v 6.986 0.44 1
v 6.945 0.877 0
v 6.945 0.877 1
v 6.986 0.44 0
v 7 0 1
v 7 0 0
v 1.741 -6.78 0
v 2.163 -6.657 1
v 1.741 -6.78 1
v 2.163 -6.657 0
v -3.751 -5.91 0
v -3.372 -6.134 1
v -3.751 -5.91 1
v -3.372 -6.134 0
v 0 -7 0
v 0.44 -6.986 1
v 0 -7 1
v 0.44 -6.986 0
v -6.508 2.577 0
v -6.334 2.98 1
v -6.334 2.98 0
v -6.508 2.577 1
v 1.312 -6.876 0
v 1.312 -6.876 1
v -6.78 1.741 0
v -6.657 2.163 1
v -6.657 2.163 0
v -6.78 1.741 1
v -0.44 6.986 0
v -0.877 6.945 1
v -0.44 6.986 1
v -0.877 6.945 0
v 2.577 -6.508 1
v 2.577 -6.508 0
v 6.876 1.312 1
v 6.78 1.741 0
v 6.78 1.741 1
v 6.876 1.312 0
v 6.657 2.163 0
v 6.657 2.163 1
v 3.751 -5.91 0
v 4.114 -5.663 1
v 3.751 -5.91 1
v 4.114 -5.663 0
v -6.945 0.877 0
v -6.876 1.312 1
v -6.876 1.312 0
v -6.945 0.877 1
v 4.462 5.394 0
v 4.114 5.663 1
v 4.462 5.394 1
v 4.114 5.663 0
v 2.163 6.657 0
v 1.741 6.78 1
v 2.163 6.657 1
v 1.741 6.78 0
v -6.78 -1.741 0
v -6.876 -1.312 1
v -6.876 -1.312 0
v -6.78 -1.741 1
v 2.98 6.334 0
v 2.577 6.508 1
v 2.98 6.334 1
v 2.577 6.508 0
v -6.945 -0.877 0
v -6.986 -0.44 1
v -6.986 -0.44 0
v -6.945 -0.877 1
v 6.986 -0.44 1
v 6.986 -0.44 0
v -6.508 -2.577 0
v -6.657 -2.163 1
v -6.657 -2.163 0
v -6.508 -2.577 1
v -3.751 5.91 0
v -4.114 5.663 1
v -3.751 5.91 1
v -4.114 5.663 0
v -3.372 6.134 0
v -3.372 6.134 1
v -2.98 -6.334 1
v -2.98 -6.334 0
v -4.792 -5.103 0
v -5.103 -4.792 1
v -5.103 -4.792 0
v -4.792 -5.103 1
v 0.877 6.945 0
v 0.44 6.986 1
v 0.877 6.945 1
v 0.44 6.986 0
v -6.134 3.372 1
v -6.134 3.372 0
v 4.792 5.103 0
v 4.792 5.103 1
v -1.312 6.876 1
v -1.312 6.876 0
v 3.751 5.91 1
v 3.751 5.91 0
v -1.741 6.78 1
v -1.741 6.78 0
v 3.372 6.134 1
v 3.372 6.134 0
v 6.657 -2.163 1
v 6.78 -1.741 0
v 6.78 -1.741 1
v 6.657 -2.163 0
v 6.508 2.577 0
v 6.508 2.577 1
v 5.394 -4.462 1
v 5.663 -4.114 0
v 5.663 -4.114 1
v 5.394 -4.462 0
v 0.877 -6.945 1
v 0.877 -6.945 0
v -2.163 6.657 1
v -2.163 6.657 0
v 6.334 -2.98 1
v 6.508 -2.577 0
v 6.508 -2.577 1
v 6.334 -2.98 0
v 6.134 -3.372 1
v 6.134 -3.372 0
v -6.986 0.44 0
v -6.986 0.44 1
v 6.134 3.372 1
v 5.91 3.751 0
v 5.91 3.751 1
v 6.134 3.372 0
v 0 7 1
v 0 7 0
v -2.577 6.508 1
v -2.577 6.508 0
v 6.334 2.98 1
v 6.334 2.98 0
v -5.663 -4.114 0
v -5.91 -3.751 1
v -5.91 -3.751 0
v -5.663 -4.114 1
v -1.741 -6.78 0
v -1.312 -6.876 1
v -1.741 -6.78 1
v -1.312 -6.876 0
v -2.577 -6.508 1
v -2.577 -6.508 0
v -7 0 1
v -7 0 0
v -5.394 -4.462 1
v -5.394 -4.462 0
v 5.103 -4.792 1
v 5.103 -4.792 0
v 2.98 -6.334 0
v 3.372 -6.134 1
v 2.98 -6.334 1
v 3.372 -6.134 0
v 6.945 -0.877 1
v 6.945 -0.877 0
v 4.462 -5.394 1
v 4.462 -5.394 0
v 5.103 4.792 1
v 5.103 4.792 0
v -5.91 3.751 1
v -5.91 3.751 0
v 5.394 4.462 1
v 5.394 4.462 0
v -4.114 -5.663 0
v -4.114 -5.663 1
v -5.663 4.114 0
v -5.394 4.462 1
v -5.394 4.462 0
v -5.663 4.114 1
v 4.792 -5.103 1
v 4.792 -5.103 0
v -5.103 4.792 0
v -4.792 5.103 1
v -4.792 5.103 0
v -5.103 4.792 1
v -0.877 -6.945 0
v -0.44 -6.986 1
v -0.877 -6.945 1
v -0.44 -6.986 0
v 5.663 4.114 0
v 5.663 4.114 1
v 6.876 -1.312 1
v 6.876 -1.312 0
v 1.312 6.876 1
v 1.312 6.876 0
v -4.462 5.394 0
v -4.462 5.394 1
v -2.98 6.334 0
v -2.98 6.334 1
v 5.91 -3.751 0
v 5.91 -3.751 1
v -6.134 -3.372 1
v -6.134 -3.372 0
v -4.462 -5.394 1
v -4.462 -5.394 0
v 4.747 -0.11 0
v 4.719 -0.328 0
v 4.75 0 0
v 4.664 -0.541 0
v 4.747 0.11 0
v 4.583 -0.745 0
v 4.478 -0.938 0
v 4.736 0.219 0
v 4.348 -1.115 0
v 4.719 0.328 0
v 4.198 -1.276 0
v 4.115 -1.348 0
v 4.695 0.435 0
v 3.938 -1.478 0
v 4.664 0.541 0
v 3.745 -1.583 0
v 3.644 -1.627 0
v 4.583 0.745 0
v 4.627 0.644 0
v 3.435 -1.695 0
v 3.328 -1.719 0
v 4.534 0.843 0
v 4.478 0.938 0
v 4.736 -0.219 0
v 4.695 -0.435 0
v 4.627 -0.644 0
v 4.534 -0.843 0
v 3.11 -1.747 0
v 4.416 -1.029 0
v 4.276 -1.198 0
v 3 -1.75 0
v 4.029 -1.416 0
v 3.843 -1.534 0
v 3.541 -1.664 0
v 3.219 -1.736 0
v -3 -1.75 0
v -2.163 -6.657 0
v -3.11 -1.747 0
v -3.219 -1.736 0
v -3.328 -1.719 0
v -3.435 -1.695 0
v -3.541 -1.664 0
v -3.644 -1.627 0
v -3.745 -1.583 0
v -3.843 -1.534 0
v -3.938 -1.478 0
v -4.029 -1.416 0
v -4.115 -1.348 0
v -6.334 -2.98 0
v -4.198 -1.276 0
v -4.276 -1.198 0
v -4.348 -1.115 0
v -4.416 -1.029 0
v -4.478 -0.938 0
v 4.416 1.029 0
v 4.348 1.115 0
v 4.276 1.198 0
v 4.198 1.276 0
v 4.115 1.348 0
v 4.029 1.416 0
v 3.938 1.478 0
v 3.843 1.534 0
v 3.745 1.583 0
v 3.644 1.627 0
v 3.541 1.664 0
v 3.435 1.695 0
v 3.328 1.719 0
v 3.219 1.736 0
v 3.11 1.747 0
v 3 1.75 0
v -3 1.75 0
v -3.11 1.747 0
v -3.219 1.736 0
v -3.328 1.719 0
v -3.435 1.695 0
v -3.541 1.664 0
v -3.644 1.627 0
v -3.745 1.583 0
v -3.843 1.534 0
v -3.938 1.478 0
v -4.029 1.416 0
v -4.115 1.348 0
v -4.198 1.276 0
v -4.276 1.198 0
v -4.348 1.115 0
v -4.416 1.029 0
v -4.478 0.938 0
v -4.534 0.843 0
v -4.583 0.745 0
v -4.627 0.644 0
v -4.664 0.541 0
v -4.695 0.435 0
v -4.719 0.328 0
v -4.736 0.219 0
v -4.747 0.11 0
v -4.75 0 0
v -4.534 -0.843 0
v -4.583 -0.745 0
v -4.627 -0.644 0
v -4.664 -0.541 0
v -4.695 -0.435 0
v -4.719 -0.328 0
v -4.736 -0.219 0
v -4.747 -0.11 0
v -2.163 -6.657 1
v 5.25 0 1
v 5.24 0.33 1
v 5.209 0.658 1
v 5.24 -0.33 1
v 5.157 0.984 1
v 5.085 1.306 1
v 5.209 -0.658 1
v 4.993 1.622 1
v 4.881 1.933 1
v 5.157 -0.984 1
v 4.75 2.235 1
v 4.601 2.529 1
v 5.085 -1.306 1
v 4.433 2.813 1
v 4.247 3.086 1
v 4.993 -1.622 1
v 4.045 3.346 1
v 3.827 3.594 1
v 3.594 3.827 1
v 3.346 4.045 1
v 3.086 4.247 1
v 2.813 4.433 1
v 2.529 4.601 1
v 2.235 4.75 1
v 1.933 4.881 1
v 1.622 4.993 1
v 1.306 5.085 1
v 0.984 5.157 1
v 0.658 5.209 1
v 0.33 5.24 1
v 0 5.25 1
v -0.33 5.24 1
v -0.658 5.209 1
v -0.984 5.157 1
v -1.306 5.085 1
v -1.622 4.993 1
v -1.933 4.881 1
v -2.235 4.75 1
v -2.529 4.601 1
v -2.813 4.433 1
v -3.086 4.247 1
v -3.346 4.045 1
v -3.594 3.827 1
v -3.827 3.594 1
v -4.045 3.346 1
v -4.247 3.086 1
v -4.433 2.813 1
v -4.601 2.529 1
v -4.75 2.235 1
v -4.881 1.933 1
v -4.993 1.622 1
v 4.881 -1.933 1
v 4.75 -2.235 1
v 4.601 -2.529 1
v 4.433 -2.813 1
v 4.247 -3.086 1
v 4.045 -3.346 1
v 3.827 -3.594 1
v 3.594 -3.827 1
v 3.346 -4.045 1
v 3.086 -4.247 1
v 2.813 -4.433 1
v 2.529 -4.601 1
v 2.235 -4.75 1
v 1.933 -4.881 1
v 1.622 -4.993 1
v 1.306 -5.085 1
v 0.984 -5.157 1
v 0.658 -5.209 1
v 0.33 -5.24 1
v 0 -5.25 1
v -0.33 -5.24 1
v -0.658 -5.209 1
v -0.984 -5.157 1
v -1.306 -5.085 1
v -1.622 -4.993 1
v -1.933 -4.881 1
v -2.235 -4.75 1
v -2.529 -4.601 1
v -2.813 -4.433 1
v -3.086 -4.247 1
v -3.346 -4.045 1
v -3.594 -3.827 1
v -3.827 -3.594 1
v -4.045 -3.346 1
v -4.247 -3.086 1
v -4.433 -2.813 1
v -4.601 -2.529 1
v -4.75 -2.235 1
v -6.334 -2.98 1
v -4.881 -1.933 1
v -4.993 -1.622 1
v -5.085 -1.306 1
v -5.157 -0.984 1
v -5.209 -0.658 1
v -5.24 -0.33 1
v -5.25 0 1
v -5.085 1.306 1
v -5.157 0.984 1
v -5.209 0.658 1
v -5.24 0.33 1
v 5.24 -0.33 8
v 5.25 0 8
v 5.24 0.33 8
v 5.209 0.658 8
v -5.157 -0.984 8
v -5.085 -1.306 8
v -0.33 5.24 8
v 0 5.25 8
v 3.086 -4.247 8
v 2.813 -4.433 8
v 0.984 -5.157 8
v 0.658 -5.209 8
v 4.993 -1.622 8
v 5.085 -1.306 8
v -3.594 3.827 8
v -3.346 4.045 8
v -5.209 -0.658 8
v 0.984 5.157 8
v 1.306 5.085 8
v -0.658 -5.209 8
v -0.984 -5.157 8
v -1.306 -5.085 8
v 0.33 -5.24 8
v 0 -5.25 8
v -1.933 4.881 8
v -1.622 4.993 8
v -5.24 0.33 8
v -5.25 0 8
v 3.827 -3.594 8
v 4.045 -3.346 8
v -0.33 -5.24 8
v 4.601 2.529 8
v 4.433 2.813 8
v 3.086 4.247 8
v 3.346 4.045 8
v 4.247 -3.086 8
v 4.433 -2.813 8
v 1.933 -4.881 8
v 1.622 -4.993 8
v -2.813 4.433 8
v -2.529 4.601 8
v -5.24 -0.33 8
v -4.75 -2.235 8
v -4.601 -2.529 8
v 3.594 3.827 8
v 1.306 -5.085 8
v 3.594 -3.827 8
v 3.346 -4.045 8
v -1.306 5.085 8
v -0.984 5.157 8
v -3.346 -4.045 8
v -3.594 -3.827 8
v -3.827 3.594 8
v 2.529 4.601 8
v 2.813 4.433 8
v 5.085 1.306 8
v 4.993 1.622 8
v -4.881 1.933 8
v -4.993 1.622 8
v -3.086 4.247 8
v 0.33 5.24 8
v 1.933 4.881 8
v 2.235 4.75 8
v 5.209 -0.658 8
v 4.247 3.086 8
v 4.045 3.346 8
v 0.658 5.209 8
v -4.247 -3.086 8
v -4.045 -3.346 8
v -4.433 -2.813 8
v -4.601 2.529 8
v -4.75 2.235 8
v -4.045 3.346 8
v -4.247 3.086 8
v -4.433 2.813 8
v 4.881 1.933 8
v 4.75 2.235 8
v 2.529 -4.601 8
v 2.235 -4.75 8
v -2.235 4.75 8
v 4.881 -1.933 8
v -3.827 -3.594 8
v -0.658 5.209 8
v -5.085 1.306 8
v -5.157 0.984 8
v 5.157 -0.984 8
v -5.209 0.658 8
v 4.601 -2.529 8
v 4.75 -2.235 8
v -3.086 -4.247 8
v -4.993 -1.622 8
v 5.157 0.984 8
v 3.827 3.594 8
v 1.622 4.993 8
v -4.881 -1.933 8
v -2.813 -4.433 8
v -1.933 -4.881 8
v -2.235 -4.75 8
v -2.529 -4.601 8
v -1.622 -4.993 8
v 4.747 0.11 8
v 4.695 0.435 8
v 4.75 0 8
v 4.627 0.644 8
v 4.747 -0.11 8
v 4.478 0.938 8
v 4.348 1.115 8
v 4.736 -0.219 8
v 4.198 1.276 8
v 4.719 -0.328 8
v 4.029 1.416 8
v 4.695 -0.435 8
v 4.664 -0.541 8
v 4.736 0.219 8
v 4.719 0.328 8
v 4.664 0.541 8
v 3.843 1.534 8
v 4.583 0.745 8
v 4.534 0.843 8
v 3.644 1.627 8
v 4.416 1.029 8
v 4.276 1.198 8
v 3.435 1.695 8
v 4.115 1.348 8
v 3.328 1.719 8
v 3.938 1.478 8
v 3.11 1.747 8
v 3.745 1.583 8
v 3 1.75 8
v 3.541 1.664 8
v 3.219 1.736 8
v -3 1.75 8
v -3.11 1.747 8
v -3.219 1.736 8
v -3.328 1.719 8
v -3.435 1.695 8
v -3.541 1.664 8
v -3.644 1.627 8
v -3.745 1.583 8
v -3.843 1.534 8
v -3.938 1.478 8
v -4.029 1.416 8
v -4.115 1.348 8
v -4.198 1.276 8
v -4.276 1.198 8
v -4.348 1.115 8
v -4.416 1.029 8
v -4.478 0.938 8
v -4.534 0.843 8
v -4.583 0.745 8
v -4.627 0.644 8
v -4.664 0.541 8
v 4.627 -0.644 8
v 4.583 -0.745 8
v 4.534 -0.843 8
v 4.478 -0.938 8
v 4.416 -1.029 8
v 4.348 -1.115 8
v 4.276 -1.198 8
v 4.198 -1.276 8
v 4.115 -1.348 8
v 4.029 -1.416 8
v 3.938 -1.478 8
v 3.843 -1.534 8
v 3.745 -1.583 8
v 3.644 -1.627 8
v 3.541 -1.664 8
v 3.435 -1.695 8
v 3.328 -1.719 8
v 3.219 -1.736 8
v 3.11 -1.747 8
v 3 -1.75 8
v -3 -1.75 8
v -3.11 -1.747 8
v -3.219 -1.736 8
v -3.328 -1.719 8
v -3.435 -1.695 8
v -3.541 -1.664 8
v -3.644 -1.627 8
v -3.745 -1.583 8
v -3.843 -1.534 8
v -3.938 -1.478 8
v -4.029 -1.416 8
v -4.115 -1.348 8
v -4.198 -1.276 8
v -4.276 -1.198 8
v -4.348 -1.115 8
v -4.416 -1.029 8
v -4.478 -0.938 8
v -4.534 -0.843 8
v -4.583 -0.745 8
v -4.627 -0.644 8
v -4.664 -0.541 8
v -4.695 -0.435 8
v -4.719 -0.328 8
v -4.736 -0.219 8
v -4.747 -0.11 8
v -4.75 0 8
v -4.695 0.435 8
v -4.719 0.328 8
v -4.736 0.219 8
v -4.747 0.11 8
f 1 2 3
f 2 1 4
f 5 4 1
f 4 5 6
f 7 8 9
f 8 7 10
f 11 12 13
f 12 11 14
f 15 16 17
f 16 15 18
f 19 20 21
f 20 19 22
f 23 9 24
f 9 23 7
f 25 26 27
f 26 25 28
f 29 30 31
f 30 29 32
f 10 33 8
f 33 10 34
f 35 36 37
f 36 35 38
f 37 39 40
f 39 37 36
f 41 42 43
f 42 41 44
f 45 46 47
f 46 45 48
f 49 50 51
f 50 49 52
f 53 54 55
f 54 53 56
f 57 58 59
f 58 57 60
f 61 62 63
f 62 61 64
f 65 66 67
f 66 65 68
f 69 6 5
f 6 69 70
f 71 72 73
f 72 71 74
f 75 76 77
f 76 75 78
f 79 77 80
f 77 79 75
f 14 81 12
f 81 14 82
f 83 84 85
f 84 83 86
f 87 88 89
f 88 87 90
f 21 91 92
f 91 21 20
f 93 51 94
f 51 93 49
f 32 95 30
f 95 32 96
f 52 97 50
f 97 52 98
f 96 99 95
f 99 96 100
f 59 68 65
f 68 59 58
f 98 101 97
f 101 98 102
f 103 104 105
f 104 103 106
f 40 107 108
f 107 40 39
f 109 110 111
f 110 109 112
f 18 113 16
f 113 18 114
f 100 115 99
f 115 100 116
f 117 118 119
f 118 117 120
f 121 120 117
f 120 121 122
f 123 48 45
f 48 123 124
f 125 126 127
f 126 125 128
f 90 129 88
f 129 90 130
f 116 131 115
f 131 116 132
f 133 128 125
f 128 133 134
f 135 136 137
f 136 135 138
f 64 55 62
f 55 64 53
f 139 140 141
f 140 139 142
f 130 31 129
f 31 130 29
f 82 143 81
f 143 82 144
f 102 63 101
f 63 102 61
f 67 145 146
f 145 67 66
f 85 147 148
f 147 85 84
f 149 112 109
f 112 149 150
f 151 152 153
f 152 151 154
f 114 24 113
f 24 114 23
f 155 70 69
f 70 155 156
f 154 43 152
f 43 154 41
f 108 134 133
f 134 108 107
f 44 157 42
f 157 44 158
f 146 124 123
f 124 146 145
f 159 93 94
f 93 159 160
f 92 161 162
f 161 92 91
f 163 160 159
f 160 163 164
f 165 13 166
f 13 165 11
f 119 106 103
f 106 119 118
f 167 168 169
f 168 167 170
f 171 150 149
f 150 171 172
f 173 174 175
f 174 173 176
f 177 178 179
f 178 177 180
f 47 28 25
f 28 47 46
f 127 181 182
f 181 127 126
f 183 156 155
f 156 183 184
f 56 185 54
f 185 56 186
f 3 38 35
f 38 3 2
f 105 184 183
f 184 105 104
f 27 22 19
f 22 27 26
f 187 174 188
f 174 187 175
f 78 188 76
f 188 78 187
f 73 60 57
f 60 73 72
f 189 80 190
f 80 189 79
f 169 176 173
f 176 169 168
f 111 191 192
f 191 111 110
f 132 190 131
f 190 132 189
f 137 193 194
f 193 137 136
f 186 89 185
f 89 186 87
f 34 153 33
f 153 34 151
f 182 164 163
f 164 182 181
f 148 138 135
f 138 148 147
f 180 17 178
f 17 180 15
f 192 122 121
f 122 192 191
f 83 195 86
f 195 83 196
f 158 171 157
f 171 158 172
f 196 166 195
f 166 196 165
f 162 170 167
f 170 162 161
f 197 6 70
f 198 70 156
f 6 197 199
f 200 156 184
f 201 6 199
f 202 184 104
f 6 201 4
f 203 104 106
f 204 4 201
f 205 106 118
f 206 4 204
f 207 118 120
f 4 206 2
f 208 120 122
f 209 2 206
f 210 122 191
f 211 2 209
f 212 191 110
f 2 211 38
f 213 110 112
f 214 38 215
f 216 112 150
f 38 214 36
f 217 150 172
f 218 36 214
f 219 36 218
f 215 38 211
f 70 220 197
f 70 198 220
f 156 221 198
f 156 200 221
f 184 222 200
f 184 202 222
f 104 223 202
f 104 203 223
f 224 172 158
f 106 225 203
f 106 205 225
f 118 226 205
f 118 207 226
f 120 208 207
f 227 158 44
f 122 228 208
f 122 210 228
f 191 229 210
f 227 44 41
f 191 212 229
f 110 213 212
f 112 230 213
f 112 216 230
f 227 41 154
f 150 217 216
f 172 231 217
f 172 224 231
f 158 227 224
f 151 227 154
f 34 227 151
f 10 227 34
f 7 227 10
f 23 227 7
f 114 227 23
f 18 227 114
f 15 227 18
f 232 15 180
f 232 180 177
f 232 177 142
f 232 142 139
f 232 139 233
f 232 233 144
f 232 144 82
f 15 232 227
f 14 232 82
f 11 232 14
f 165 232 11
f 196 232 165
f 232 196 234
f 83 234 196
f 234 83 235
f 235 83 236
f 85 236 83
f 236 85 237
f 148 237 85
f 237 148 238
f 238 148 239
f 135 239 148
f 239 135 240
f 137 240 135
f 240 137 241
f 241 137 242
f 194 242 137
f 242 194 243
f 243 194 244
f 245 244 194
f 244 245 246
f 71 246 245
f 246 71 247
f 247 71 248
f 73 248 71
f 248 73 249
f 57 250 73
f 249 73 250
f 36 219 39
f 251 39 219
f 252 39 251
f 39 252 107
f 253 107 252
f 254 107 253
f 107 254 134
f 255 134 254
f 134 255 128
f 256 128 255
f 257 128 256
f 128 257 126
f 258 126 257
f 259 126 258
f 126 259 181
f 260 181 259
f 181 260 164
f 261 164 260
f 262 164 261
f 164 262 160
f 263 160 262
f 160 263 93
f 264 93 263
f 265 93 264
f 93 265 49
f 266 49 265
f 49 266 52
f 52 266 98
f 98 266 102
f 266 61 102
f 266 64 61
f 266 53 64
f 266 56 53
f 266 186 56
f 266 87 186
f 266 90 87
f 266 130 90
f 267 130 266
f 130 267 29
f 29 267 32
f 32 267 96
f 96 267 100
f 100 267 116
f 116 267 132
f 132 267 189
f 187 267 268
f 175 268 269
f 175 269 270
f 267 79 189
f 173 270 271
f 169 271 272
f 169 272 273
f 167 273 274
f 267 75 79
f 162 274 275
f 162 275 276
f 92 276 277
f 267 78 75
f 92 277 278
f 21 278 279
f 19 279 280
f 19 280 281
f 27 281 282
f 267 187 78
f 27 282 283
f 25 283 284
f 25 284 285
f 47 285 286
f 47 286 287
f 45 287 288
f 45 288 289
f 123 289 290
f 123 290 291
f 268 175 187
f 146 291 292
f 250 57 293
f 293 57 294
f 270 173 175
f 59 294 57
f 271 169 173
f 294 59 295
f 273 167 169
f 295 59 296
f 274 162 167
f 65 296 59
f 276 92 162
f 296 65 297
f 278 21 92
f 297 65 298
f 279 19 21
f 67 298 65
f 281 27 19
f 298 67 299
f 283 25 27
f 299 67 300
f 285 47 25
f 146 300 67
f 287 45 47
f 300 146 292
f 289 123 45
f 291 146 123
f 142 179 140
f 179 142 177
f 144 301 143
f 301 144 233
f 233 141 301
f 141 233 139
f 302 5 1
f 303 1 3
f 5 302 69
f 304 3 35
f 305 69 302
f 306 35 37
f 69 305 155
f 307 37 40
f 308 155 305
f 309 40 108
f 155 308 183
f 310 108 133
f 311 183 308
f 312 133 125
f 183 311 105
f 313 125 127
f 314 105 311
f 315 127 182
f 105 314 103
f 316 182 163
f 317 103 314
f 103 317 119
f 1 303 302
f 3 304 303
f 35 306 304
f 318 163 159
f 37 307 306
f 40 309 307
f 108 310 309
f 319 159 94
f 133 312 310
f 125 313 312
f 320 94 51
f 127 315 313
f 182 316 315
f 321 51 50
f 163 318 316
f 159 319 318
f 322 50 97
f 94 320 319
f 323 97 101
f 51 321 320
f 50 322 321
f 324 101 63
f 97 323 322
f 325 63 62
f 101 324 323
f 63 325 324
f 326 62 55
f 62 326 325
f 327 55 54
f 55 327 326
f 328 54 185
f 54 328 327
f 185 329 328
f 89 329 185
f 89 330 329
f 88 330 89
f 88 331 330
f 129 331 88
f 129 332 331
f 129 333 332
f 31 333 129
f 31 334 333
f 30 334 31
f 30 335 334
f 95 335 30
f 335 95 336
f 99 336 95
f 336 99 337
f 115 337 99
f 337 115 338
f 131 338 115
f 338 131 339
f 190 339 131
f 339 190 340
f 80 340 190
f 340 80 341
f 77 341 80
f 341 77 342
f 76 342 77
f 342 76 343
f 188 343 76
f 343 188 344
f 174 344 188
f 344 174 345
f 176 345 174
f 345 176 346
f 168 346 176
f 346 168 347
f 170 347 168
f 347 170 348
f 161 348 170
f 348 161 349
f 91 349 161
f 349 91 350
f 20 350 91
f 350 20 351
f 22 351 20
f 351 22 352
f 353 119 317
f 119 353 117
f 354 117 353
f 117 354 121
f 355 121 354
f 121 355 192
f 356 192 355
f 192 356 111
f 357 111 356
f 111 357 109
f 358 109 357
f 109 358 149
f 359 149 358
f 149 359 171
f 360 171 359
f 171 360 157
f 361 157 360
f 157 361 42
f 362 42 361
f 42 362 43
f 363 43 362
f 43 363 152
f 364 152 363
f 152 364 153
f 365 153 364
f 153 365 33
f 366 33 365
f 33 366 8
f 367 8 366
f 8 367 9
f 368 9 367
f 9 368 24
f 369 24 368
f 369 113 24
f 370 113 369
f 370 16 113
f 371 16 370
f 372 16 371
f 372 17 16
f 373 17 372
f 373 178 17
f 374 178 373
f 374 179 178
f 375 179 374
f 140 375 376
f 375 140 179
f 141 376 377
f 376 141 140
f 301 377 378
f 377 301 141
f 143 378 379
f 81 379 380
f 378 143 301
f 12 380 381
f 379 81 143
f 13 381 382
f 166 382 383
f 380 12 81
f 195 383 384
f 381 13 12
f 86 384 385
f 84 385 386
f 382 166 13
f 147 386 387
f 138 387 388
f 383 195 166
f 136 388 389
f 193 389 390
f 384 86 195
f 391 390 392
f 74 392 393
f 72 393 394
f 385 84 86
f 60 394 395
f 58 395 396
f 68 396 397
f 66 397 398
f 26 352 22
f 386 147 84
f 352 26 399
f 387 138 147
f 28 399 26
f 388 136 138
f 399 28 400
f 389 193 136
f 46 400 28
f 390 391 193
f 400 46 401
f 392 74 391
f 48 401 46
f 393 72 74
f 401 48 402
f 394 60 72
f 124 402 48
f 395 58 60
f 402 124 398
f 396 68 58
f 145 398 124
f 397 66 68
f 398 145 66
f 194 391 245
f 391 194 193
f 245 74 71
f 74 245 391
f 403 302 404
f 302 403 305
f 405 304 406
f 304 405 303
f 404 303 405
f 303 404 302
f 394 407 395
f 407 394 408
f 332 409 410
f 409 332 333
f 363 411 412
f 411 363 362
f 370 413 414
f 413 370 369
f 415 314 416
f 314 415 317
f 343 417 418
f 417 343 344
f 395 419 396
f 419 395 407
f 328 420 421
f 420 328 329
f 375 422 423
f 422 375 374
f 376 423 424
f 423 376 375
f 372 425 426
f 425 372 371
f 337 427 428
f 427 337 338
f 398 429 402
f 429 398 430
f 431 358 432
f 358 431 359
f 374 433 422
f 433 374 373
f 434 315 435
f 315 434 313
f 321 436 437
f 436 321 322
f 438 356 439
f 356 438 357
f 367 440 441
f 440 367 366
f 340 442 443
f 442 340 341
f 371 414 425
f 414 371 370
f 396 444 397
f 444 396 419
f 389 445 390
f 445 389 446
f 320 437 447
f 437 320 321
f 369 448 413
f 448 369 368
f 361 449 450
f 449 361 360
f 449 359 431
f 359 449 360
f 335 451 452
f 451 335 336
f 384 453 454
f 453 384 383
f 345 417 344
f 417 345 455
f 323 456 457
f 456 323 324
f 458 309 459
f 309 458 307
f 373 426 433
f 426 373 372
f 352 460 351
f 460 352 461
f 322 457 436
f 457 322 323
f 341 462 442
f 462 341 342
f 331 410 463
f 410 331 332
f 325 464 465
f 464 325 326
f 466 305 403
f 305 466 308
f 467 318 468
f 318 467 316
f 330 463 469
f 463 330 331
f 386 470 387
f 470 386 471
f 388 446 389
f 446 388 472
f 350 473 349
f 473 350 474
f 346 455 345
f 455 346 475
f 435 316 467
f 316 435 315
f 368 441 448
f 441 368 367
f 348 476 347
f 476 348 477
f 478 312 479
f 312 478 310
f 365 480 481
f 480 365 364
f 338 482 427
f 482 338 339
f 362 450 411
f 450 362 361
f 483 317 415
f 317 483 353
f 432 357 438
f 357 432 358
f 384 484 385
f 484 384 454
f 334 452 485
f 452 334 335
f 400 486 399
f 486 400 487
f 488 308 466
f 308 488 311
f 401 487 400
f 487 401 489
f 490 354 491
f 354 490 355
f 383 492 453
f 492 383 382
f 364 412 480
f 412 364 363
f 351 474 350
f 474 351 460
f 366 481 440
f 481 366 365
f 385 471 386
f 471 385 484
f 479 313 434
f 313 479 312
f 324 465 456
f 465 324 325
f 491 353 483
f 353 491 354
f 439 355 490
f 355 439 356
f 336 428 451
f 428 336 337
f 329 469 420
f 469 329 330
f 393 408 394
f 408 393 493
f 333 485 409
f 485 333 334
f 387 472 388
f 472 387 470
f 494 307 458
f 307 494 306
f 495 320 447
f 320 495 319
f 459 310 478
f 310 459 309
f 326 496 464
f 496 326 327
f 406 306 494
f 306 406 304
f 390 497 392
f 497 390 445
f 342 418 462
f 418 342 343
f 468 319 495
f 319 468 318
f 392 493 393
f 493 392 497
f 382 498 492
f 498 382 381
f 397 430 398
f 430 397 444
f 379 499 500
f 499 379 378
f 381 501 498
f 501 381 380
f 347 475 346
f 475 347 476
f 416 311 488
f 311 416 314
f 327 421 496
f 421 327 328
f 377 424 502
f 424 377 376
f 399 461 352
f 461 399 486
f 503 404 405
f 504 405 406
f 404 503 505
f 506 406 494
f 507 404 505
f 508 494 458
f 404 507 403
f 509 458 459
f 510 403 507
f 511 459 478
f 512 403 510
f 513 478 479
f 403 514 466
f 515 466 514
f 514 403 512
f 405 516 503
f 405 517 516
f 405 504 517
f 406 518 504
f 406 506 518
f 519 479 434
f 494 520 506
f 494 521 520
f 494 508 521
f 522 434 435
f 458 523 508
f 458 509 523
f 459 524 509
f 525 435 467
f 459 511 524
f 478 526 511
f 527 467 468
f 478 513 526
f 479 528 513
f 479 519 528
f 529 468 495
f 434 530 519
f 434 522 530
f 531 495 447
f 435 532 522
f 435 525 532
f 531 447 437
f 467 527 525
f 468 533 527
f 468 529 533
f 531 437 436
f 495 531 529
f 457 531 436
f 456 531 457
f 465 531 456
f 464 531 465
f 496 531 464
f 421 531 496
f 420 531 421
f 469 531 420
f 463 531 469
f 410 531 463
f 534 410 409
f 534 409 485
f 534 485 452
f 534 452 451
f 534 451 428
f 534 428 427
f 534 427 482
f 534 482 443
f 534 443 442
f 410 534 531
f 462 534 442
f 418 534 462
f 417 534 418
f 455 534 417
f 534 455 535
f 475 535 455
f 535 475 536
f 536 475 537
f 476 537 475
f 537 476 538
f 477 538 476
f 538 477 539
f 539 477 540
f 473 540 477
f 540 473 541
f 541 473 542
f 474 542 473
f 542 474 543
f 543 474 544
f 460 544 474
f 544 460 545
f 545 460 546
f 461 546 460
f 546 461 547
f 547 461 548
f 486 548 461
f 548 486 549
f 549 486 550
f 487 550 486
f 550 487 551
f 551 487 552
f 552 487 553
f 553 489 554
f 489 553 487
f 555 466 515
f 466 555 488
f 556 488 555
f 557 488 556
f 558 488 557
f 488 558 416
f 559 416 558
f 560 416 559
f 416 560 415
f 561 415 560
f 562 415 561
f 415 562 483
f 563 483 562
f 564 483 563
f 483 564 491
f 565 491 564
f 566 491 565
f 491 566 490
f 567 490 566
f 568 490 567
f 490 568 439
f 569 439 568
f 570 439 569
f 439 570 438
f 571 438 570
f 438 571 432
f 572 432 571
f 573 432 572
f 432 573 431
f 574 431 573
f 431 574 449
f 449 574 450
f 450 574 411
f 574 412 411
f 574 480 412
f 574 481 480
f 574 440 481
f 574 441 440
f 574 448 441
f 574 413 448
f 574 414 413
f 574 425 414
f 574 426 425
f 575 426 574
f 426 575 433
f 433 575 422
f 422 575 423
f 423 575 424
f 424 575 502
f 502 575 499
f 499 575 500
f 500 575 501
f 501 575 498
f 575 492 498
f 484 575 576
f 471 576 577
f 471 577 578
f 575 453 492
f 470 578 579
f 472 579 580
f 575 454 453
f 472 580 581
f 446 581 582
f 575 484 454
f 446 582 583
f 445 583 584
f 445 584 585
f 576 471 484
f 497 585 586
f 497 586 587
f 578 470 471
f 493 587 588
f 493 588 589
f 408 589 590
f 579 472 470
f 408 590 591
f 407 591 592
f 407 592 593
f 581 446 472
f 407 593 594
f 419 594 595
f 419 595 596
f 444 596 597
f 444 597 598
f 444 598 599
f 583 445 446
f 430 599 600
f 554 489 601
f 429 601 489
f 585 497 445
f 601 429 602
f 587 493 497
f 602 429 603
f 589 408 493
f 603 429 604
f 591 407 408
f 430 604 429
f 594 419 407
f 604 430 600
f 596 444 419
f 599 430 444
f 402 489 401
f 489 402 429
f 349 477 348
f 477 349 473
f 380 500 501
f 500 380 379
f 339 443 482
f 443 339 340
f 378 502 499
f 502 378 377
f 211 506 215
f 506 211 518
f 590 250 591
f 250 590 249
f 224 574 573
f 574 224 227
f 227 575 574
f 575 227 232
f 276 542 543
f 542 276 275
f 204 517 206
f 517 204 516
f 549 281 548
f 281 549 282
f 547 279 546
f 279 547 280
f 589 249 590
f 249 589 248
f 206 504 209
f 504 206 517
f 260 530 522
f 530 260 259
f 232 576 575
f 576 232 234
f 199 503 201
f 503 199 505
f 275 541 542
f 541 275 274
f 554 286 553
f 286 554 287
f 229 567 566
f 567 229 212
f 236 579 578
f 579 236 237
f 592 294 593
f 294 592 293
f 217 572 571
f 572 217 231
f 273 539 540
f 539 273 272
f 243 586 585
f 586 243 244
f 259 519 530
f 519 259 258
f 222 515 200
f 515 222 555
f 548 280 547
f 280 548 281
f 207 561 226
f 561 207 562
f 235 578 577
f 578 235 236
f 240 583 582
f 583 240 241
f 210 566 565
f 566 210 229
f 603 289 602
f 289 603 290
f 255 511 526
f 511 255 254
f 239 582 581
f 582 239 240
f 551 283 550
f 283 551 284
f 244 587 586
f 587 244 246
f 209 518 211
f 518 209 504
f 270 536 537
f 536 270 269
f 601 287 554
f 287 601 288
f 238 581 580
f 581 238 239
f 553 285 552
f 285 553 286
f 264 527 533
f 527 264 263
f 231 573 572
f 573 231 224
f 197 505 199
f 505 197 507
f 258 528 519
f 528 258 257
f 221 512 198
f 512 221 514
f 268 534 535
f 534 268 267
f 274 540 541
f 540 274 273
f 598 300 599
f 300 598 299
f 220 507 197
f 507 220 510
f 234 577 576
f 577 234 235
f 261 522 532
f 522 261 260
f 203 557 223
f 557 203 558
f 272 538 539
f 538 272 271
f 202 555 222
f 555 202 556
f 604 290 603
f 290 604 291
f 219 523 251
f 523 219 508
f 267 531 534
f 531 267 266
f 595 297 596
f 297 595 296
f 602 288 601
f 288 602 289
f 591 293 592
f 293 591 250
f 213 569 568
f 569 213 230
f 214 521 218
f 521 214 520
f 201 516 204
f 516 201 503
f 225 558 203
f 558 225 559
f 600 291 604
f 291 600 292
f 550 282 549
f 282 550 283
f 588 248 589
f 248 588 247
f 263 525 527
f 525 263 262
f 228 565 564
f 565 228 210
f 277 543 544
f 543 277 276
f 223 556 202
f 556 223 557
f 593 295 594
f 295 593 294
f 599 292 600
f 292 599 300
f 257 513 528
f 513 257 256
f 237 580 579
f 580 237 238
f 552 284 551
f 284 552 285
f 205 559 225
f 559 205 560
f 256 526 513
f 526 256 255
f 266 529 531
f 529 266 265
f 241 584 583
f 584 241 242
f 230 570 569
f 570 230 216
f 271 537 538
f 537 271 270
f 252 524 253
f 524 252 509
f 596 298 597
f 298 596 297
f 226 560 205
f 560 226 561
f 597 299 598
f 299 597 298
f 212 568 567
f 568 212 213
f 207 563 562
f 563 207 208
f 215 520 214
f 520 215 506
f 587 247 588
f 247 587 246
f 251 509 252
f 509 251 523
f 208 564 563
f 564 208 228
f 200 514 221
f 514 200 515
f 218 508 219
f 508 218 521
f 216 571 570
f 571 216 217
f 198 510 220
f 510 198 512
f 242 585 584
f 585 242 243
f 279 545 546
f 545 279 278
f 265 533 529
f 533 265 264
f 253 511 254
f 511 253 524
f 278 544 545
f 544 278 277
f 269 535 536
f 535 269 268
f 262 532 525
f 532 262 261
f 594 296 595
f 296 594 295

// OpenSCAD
OUTER_DIA = 10.5;
LIP_DIA = 14;
LIP_HEIGHT = 1;
HEIGHT = 8;

USBC_DIA = 3.5;
USBC_WIDTH = 9.5;

$fn = 100;

module base() {
    cylinder(d = LIP_DIA, h = LIP_HEIGHT);
    cylinder(d = OUTER_DIA, h = HEIGHT);
}

module usbc_connector() {
   hull() {
      for(i = [-1, 1]) {
          translate([i * (USBC_WIDTH - USBC_DIA)/2, 0, 0])
          cylinder(d = USBC_DIA, h = HEIGHT);
      }
   }
}

difference() {
    base();
    usbc_connector();
}
